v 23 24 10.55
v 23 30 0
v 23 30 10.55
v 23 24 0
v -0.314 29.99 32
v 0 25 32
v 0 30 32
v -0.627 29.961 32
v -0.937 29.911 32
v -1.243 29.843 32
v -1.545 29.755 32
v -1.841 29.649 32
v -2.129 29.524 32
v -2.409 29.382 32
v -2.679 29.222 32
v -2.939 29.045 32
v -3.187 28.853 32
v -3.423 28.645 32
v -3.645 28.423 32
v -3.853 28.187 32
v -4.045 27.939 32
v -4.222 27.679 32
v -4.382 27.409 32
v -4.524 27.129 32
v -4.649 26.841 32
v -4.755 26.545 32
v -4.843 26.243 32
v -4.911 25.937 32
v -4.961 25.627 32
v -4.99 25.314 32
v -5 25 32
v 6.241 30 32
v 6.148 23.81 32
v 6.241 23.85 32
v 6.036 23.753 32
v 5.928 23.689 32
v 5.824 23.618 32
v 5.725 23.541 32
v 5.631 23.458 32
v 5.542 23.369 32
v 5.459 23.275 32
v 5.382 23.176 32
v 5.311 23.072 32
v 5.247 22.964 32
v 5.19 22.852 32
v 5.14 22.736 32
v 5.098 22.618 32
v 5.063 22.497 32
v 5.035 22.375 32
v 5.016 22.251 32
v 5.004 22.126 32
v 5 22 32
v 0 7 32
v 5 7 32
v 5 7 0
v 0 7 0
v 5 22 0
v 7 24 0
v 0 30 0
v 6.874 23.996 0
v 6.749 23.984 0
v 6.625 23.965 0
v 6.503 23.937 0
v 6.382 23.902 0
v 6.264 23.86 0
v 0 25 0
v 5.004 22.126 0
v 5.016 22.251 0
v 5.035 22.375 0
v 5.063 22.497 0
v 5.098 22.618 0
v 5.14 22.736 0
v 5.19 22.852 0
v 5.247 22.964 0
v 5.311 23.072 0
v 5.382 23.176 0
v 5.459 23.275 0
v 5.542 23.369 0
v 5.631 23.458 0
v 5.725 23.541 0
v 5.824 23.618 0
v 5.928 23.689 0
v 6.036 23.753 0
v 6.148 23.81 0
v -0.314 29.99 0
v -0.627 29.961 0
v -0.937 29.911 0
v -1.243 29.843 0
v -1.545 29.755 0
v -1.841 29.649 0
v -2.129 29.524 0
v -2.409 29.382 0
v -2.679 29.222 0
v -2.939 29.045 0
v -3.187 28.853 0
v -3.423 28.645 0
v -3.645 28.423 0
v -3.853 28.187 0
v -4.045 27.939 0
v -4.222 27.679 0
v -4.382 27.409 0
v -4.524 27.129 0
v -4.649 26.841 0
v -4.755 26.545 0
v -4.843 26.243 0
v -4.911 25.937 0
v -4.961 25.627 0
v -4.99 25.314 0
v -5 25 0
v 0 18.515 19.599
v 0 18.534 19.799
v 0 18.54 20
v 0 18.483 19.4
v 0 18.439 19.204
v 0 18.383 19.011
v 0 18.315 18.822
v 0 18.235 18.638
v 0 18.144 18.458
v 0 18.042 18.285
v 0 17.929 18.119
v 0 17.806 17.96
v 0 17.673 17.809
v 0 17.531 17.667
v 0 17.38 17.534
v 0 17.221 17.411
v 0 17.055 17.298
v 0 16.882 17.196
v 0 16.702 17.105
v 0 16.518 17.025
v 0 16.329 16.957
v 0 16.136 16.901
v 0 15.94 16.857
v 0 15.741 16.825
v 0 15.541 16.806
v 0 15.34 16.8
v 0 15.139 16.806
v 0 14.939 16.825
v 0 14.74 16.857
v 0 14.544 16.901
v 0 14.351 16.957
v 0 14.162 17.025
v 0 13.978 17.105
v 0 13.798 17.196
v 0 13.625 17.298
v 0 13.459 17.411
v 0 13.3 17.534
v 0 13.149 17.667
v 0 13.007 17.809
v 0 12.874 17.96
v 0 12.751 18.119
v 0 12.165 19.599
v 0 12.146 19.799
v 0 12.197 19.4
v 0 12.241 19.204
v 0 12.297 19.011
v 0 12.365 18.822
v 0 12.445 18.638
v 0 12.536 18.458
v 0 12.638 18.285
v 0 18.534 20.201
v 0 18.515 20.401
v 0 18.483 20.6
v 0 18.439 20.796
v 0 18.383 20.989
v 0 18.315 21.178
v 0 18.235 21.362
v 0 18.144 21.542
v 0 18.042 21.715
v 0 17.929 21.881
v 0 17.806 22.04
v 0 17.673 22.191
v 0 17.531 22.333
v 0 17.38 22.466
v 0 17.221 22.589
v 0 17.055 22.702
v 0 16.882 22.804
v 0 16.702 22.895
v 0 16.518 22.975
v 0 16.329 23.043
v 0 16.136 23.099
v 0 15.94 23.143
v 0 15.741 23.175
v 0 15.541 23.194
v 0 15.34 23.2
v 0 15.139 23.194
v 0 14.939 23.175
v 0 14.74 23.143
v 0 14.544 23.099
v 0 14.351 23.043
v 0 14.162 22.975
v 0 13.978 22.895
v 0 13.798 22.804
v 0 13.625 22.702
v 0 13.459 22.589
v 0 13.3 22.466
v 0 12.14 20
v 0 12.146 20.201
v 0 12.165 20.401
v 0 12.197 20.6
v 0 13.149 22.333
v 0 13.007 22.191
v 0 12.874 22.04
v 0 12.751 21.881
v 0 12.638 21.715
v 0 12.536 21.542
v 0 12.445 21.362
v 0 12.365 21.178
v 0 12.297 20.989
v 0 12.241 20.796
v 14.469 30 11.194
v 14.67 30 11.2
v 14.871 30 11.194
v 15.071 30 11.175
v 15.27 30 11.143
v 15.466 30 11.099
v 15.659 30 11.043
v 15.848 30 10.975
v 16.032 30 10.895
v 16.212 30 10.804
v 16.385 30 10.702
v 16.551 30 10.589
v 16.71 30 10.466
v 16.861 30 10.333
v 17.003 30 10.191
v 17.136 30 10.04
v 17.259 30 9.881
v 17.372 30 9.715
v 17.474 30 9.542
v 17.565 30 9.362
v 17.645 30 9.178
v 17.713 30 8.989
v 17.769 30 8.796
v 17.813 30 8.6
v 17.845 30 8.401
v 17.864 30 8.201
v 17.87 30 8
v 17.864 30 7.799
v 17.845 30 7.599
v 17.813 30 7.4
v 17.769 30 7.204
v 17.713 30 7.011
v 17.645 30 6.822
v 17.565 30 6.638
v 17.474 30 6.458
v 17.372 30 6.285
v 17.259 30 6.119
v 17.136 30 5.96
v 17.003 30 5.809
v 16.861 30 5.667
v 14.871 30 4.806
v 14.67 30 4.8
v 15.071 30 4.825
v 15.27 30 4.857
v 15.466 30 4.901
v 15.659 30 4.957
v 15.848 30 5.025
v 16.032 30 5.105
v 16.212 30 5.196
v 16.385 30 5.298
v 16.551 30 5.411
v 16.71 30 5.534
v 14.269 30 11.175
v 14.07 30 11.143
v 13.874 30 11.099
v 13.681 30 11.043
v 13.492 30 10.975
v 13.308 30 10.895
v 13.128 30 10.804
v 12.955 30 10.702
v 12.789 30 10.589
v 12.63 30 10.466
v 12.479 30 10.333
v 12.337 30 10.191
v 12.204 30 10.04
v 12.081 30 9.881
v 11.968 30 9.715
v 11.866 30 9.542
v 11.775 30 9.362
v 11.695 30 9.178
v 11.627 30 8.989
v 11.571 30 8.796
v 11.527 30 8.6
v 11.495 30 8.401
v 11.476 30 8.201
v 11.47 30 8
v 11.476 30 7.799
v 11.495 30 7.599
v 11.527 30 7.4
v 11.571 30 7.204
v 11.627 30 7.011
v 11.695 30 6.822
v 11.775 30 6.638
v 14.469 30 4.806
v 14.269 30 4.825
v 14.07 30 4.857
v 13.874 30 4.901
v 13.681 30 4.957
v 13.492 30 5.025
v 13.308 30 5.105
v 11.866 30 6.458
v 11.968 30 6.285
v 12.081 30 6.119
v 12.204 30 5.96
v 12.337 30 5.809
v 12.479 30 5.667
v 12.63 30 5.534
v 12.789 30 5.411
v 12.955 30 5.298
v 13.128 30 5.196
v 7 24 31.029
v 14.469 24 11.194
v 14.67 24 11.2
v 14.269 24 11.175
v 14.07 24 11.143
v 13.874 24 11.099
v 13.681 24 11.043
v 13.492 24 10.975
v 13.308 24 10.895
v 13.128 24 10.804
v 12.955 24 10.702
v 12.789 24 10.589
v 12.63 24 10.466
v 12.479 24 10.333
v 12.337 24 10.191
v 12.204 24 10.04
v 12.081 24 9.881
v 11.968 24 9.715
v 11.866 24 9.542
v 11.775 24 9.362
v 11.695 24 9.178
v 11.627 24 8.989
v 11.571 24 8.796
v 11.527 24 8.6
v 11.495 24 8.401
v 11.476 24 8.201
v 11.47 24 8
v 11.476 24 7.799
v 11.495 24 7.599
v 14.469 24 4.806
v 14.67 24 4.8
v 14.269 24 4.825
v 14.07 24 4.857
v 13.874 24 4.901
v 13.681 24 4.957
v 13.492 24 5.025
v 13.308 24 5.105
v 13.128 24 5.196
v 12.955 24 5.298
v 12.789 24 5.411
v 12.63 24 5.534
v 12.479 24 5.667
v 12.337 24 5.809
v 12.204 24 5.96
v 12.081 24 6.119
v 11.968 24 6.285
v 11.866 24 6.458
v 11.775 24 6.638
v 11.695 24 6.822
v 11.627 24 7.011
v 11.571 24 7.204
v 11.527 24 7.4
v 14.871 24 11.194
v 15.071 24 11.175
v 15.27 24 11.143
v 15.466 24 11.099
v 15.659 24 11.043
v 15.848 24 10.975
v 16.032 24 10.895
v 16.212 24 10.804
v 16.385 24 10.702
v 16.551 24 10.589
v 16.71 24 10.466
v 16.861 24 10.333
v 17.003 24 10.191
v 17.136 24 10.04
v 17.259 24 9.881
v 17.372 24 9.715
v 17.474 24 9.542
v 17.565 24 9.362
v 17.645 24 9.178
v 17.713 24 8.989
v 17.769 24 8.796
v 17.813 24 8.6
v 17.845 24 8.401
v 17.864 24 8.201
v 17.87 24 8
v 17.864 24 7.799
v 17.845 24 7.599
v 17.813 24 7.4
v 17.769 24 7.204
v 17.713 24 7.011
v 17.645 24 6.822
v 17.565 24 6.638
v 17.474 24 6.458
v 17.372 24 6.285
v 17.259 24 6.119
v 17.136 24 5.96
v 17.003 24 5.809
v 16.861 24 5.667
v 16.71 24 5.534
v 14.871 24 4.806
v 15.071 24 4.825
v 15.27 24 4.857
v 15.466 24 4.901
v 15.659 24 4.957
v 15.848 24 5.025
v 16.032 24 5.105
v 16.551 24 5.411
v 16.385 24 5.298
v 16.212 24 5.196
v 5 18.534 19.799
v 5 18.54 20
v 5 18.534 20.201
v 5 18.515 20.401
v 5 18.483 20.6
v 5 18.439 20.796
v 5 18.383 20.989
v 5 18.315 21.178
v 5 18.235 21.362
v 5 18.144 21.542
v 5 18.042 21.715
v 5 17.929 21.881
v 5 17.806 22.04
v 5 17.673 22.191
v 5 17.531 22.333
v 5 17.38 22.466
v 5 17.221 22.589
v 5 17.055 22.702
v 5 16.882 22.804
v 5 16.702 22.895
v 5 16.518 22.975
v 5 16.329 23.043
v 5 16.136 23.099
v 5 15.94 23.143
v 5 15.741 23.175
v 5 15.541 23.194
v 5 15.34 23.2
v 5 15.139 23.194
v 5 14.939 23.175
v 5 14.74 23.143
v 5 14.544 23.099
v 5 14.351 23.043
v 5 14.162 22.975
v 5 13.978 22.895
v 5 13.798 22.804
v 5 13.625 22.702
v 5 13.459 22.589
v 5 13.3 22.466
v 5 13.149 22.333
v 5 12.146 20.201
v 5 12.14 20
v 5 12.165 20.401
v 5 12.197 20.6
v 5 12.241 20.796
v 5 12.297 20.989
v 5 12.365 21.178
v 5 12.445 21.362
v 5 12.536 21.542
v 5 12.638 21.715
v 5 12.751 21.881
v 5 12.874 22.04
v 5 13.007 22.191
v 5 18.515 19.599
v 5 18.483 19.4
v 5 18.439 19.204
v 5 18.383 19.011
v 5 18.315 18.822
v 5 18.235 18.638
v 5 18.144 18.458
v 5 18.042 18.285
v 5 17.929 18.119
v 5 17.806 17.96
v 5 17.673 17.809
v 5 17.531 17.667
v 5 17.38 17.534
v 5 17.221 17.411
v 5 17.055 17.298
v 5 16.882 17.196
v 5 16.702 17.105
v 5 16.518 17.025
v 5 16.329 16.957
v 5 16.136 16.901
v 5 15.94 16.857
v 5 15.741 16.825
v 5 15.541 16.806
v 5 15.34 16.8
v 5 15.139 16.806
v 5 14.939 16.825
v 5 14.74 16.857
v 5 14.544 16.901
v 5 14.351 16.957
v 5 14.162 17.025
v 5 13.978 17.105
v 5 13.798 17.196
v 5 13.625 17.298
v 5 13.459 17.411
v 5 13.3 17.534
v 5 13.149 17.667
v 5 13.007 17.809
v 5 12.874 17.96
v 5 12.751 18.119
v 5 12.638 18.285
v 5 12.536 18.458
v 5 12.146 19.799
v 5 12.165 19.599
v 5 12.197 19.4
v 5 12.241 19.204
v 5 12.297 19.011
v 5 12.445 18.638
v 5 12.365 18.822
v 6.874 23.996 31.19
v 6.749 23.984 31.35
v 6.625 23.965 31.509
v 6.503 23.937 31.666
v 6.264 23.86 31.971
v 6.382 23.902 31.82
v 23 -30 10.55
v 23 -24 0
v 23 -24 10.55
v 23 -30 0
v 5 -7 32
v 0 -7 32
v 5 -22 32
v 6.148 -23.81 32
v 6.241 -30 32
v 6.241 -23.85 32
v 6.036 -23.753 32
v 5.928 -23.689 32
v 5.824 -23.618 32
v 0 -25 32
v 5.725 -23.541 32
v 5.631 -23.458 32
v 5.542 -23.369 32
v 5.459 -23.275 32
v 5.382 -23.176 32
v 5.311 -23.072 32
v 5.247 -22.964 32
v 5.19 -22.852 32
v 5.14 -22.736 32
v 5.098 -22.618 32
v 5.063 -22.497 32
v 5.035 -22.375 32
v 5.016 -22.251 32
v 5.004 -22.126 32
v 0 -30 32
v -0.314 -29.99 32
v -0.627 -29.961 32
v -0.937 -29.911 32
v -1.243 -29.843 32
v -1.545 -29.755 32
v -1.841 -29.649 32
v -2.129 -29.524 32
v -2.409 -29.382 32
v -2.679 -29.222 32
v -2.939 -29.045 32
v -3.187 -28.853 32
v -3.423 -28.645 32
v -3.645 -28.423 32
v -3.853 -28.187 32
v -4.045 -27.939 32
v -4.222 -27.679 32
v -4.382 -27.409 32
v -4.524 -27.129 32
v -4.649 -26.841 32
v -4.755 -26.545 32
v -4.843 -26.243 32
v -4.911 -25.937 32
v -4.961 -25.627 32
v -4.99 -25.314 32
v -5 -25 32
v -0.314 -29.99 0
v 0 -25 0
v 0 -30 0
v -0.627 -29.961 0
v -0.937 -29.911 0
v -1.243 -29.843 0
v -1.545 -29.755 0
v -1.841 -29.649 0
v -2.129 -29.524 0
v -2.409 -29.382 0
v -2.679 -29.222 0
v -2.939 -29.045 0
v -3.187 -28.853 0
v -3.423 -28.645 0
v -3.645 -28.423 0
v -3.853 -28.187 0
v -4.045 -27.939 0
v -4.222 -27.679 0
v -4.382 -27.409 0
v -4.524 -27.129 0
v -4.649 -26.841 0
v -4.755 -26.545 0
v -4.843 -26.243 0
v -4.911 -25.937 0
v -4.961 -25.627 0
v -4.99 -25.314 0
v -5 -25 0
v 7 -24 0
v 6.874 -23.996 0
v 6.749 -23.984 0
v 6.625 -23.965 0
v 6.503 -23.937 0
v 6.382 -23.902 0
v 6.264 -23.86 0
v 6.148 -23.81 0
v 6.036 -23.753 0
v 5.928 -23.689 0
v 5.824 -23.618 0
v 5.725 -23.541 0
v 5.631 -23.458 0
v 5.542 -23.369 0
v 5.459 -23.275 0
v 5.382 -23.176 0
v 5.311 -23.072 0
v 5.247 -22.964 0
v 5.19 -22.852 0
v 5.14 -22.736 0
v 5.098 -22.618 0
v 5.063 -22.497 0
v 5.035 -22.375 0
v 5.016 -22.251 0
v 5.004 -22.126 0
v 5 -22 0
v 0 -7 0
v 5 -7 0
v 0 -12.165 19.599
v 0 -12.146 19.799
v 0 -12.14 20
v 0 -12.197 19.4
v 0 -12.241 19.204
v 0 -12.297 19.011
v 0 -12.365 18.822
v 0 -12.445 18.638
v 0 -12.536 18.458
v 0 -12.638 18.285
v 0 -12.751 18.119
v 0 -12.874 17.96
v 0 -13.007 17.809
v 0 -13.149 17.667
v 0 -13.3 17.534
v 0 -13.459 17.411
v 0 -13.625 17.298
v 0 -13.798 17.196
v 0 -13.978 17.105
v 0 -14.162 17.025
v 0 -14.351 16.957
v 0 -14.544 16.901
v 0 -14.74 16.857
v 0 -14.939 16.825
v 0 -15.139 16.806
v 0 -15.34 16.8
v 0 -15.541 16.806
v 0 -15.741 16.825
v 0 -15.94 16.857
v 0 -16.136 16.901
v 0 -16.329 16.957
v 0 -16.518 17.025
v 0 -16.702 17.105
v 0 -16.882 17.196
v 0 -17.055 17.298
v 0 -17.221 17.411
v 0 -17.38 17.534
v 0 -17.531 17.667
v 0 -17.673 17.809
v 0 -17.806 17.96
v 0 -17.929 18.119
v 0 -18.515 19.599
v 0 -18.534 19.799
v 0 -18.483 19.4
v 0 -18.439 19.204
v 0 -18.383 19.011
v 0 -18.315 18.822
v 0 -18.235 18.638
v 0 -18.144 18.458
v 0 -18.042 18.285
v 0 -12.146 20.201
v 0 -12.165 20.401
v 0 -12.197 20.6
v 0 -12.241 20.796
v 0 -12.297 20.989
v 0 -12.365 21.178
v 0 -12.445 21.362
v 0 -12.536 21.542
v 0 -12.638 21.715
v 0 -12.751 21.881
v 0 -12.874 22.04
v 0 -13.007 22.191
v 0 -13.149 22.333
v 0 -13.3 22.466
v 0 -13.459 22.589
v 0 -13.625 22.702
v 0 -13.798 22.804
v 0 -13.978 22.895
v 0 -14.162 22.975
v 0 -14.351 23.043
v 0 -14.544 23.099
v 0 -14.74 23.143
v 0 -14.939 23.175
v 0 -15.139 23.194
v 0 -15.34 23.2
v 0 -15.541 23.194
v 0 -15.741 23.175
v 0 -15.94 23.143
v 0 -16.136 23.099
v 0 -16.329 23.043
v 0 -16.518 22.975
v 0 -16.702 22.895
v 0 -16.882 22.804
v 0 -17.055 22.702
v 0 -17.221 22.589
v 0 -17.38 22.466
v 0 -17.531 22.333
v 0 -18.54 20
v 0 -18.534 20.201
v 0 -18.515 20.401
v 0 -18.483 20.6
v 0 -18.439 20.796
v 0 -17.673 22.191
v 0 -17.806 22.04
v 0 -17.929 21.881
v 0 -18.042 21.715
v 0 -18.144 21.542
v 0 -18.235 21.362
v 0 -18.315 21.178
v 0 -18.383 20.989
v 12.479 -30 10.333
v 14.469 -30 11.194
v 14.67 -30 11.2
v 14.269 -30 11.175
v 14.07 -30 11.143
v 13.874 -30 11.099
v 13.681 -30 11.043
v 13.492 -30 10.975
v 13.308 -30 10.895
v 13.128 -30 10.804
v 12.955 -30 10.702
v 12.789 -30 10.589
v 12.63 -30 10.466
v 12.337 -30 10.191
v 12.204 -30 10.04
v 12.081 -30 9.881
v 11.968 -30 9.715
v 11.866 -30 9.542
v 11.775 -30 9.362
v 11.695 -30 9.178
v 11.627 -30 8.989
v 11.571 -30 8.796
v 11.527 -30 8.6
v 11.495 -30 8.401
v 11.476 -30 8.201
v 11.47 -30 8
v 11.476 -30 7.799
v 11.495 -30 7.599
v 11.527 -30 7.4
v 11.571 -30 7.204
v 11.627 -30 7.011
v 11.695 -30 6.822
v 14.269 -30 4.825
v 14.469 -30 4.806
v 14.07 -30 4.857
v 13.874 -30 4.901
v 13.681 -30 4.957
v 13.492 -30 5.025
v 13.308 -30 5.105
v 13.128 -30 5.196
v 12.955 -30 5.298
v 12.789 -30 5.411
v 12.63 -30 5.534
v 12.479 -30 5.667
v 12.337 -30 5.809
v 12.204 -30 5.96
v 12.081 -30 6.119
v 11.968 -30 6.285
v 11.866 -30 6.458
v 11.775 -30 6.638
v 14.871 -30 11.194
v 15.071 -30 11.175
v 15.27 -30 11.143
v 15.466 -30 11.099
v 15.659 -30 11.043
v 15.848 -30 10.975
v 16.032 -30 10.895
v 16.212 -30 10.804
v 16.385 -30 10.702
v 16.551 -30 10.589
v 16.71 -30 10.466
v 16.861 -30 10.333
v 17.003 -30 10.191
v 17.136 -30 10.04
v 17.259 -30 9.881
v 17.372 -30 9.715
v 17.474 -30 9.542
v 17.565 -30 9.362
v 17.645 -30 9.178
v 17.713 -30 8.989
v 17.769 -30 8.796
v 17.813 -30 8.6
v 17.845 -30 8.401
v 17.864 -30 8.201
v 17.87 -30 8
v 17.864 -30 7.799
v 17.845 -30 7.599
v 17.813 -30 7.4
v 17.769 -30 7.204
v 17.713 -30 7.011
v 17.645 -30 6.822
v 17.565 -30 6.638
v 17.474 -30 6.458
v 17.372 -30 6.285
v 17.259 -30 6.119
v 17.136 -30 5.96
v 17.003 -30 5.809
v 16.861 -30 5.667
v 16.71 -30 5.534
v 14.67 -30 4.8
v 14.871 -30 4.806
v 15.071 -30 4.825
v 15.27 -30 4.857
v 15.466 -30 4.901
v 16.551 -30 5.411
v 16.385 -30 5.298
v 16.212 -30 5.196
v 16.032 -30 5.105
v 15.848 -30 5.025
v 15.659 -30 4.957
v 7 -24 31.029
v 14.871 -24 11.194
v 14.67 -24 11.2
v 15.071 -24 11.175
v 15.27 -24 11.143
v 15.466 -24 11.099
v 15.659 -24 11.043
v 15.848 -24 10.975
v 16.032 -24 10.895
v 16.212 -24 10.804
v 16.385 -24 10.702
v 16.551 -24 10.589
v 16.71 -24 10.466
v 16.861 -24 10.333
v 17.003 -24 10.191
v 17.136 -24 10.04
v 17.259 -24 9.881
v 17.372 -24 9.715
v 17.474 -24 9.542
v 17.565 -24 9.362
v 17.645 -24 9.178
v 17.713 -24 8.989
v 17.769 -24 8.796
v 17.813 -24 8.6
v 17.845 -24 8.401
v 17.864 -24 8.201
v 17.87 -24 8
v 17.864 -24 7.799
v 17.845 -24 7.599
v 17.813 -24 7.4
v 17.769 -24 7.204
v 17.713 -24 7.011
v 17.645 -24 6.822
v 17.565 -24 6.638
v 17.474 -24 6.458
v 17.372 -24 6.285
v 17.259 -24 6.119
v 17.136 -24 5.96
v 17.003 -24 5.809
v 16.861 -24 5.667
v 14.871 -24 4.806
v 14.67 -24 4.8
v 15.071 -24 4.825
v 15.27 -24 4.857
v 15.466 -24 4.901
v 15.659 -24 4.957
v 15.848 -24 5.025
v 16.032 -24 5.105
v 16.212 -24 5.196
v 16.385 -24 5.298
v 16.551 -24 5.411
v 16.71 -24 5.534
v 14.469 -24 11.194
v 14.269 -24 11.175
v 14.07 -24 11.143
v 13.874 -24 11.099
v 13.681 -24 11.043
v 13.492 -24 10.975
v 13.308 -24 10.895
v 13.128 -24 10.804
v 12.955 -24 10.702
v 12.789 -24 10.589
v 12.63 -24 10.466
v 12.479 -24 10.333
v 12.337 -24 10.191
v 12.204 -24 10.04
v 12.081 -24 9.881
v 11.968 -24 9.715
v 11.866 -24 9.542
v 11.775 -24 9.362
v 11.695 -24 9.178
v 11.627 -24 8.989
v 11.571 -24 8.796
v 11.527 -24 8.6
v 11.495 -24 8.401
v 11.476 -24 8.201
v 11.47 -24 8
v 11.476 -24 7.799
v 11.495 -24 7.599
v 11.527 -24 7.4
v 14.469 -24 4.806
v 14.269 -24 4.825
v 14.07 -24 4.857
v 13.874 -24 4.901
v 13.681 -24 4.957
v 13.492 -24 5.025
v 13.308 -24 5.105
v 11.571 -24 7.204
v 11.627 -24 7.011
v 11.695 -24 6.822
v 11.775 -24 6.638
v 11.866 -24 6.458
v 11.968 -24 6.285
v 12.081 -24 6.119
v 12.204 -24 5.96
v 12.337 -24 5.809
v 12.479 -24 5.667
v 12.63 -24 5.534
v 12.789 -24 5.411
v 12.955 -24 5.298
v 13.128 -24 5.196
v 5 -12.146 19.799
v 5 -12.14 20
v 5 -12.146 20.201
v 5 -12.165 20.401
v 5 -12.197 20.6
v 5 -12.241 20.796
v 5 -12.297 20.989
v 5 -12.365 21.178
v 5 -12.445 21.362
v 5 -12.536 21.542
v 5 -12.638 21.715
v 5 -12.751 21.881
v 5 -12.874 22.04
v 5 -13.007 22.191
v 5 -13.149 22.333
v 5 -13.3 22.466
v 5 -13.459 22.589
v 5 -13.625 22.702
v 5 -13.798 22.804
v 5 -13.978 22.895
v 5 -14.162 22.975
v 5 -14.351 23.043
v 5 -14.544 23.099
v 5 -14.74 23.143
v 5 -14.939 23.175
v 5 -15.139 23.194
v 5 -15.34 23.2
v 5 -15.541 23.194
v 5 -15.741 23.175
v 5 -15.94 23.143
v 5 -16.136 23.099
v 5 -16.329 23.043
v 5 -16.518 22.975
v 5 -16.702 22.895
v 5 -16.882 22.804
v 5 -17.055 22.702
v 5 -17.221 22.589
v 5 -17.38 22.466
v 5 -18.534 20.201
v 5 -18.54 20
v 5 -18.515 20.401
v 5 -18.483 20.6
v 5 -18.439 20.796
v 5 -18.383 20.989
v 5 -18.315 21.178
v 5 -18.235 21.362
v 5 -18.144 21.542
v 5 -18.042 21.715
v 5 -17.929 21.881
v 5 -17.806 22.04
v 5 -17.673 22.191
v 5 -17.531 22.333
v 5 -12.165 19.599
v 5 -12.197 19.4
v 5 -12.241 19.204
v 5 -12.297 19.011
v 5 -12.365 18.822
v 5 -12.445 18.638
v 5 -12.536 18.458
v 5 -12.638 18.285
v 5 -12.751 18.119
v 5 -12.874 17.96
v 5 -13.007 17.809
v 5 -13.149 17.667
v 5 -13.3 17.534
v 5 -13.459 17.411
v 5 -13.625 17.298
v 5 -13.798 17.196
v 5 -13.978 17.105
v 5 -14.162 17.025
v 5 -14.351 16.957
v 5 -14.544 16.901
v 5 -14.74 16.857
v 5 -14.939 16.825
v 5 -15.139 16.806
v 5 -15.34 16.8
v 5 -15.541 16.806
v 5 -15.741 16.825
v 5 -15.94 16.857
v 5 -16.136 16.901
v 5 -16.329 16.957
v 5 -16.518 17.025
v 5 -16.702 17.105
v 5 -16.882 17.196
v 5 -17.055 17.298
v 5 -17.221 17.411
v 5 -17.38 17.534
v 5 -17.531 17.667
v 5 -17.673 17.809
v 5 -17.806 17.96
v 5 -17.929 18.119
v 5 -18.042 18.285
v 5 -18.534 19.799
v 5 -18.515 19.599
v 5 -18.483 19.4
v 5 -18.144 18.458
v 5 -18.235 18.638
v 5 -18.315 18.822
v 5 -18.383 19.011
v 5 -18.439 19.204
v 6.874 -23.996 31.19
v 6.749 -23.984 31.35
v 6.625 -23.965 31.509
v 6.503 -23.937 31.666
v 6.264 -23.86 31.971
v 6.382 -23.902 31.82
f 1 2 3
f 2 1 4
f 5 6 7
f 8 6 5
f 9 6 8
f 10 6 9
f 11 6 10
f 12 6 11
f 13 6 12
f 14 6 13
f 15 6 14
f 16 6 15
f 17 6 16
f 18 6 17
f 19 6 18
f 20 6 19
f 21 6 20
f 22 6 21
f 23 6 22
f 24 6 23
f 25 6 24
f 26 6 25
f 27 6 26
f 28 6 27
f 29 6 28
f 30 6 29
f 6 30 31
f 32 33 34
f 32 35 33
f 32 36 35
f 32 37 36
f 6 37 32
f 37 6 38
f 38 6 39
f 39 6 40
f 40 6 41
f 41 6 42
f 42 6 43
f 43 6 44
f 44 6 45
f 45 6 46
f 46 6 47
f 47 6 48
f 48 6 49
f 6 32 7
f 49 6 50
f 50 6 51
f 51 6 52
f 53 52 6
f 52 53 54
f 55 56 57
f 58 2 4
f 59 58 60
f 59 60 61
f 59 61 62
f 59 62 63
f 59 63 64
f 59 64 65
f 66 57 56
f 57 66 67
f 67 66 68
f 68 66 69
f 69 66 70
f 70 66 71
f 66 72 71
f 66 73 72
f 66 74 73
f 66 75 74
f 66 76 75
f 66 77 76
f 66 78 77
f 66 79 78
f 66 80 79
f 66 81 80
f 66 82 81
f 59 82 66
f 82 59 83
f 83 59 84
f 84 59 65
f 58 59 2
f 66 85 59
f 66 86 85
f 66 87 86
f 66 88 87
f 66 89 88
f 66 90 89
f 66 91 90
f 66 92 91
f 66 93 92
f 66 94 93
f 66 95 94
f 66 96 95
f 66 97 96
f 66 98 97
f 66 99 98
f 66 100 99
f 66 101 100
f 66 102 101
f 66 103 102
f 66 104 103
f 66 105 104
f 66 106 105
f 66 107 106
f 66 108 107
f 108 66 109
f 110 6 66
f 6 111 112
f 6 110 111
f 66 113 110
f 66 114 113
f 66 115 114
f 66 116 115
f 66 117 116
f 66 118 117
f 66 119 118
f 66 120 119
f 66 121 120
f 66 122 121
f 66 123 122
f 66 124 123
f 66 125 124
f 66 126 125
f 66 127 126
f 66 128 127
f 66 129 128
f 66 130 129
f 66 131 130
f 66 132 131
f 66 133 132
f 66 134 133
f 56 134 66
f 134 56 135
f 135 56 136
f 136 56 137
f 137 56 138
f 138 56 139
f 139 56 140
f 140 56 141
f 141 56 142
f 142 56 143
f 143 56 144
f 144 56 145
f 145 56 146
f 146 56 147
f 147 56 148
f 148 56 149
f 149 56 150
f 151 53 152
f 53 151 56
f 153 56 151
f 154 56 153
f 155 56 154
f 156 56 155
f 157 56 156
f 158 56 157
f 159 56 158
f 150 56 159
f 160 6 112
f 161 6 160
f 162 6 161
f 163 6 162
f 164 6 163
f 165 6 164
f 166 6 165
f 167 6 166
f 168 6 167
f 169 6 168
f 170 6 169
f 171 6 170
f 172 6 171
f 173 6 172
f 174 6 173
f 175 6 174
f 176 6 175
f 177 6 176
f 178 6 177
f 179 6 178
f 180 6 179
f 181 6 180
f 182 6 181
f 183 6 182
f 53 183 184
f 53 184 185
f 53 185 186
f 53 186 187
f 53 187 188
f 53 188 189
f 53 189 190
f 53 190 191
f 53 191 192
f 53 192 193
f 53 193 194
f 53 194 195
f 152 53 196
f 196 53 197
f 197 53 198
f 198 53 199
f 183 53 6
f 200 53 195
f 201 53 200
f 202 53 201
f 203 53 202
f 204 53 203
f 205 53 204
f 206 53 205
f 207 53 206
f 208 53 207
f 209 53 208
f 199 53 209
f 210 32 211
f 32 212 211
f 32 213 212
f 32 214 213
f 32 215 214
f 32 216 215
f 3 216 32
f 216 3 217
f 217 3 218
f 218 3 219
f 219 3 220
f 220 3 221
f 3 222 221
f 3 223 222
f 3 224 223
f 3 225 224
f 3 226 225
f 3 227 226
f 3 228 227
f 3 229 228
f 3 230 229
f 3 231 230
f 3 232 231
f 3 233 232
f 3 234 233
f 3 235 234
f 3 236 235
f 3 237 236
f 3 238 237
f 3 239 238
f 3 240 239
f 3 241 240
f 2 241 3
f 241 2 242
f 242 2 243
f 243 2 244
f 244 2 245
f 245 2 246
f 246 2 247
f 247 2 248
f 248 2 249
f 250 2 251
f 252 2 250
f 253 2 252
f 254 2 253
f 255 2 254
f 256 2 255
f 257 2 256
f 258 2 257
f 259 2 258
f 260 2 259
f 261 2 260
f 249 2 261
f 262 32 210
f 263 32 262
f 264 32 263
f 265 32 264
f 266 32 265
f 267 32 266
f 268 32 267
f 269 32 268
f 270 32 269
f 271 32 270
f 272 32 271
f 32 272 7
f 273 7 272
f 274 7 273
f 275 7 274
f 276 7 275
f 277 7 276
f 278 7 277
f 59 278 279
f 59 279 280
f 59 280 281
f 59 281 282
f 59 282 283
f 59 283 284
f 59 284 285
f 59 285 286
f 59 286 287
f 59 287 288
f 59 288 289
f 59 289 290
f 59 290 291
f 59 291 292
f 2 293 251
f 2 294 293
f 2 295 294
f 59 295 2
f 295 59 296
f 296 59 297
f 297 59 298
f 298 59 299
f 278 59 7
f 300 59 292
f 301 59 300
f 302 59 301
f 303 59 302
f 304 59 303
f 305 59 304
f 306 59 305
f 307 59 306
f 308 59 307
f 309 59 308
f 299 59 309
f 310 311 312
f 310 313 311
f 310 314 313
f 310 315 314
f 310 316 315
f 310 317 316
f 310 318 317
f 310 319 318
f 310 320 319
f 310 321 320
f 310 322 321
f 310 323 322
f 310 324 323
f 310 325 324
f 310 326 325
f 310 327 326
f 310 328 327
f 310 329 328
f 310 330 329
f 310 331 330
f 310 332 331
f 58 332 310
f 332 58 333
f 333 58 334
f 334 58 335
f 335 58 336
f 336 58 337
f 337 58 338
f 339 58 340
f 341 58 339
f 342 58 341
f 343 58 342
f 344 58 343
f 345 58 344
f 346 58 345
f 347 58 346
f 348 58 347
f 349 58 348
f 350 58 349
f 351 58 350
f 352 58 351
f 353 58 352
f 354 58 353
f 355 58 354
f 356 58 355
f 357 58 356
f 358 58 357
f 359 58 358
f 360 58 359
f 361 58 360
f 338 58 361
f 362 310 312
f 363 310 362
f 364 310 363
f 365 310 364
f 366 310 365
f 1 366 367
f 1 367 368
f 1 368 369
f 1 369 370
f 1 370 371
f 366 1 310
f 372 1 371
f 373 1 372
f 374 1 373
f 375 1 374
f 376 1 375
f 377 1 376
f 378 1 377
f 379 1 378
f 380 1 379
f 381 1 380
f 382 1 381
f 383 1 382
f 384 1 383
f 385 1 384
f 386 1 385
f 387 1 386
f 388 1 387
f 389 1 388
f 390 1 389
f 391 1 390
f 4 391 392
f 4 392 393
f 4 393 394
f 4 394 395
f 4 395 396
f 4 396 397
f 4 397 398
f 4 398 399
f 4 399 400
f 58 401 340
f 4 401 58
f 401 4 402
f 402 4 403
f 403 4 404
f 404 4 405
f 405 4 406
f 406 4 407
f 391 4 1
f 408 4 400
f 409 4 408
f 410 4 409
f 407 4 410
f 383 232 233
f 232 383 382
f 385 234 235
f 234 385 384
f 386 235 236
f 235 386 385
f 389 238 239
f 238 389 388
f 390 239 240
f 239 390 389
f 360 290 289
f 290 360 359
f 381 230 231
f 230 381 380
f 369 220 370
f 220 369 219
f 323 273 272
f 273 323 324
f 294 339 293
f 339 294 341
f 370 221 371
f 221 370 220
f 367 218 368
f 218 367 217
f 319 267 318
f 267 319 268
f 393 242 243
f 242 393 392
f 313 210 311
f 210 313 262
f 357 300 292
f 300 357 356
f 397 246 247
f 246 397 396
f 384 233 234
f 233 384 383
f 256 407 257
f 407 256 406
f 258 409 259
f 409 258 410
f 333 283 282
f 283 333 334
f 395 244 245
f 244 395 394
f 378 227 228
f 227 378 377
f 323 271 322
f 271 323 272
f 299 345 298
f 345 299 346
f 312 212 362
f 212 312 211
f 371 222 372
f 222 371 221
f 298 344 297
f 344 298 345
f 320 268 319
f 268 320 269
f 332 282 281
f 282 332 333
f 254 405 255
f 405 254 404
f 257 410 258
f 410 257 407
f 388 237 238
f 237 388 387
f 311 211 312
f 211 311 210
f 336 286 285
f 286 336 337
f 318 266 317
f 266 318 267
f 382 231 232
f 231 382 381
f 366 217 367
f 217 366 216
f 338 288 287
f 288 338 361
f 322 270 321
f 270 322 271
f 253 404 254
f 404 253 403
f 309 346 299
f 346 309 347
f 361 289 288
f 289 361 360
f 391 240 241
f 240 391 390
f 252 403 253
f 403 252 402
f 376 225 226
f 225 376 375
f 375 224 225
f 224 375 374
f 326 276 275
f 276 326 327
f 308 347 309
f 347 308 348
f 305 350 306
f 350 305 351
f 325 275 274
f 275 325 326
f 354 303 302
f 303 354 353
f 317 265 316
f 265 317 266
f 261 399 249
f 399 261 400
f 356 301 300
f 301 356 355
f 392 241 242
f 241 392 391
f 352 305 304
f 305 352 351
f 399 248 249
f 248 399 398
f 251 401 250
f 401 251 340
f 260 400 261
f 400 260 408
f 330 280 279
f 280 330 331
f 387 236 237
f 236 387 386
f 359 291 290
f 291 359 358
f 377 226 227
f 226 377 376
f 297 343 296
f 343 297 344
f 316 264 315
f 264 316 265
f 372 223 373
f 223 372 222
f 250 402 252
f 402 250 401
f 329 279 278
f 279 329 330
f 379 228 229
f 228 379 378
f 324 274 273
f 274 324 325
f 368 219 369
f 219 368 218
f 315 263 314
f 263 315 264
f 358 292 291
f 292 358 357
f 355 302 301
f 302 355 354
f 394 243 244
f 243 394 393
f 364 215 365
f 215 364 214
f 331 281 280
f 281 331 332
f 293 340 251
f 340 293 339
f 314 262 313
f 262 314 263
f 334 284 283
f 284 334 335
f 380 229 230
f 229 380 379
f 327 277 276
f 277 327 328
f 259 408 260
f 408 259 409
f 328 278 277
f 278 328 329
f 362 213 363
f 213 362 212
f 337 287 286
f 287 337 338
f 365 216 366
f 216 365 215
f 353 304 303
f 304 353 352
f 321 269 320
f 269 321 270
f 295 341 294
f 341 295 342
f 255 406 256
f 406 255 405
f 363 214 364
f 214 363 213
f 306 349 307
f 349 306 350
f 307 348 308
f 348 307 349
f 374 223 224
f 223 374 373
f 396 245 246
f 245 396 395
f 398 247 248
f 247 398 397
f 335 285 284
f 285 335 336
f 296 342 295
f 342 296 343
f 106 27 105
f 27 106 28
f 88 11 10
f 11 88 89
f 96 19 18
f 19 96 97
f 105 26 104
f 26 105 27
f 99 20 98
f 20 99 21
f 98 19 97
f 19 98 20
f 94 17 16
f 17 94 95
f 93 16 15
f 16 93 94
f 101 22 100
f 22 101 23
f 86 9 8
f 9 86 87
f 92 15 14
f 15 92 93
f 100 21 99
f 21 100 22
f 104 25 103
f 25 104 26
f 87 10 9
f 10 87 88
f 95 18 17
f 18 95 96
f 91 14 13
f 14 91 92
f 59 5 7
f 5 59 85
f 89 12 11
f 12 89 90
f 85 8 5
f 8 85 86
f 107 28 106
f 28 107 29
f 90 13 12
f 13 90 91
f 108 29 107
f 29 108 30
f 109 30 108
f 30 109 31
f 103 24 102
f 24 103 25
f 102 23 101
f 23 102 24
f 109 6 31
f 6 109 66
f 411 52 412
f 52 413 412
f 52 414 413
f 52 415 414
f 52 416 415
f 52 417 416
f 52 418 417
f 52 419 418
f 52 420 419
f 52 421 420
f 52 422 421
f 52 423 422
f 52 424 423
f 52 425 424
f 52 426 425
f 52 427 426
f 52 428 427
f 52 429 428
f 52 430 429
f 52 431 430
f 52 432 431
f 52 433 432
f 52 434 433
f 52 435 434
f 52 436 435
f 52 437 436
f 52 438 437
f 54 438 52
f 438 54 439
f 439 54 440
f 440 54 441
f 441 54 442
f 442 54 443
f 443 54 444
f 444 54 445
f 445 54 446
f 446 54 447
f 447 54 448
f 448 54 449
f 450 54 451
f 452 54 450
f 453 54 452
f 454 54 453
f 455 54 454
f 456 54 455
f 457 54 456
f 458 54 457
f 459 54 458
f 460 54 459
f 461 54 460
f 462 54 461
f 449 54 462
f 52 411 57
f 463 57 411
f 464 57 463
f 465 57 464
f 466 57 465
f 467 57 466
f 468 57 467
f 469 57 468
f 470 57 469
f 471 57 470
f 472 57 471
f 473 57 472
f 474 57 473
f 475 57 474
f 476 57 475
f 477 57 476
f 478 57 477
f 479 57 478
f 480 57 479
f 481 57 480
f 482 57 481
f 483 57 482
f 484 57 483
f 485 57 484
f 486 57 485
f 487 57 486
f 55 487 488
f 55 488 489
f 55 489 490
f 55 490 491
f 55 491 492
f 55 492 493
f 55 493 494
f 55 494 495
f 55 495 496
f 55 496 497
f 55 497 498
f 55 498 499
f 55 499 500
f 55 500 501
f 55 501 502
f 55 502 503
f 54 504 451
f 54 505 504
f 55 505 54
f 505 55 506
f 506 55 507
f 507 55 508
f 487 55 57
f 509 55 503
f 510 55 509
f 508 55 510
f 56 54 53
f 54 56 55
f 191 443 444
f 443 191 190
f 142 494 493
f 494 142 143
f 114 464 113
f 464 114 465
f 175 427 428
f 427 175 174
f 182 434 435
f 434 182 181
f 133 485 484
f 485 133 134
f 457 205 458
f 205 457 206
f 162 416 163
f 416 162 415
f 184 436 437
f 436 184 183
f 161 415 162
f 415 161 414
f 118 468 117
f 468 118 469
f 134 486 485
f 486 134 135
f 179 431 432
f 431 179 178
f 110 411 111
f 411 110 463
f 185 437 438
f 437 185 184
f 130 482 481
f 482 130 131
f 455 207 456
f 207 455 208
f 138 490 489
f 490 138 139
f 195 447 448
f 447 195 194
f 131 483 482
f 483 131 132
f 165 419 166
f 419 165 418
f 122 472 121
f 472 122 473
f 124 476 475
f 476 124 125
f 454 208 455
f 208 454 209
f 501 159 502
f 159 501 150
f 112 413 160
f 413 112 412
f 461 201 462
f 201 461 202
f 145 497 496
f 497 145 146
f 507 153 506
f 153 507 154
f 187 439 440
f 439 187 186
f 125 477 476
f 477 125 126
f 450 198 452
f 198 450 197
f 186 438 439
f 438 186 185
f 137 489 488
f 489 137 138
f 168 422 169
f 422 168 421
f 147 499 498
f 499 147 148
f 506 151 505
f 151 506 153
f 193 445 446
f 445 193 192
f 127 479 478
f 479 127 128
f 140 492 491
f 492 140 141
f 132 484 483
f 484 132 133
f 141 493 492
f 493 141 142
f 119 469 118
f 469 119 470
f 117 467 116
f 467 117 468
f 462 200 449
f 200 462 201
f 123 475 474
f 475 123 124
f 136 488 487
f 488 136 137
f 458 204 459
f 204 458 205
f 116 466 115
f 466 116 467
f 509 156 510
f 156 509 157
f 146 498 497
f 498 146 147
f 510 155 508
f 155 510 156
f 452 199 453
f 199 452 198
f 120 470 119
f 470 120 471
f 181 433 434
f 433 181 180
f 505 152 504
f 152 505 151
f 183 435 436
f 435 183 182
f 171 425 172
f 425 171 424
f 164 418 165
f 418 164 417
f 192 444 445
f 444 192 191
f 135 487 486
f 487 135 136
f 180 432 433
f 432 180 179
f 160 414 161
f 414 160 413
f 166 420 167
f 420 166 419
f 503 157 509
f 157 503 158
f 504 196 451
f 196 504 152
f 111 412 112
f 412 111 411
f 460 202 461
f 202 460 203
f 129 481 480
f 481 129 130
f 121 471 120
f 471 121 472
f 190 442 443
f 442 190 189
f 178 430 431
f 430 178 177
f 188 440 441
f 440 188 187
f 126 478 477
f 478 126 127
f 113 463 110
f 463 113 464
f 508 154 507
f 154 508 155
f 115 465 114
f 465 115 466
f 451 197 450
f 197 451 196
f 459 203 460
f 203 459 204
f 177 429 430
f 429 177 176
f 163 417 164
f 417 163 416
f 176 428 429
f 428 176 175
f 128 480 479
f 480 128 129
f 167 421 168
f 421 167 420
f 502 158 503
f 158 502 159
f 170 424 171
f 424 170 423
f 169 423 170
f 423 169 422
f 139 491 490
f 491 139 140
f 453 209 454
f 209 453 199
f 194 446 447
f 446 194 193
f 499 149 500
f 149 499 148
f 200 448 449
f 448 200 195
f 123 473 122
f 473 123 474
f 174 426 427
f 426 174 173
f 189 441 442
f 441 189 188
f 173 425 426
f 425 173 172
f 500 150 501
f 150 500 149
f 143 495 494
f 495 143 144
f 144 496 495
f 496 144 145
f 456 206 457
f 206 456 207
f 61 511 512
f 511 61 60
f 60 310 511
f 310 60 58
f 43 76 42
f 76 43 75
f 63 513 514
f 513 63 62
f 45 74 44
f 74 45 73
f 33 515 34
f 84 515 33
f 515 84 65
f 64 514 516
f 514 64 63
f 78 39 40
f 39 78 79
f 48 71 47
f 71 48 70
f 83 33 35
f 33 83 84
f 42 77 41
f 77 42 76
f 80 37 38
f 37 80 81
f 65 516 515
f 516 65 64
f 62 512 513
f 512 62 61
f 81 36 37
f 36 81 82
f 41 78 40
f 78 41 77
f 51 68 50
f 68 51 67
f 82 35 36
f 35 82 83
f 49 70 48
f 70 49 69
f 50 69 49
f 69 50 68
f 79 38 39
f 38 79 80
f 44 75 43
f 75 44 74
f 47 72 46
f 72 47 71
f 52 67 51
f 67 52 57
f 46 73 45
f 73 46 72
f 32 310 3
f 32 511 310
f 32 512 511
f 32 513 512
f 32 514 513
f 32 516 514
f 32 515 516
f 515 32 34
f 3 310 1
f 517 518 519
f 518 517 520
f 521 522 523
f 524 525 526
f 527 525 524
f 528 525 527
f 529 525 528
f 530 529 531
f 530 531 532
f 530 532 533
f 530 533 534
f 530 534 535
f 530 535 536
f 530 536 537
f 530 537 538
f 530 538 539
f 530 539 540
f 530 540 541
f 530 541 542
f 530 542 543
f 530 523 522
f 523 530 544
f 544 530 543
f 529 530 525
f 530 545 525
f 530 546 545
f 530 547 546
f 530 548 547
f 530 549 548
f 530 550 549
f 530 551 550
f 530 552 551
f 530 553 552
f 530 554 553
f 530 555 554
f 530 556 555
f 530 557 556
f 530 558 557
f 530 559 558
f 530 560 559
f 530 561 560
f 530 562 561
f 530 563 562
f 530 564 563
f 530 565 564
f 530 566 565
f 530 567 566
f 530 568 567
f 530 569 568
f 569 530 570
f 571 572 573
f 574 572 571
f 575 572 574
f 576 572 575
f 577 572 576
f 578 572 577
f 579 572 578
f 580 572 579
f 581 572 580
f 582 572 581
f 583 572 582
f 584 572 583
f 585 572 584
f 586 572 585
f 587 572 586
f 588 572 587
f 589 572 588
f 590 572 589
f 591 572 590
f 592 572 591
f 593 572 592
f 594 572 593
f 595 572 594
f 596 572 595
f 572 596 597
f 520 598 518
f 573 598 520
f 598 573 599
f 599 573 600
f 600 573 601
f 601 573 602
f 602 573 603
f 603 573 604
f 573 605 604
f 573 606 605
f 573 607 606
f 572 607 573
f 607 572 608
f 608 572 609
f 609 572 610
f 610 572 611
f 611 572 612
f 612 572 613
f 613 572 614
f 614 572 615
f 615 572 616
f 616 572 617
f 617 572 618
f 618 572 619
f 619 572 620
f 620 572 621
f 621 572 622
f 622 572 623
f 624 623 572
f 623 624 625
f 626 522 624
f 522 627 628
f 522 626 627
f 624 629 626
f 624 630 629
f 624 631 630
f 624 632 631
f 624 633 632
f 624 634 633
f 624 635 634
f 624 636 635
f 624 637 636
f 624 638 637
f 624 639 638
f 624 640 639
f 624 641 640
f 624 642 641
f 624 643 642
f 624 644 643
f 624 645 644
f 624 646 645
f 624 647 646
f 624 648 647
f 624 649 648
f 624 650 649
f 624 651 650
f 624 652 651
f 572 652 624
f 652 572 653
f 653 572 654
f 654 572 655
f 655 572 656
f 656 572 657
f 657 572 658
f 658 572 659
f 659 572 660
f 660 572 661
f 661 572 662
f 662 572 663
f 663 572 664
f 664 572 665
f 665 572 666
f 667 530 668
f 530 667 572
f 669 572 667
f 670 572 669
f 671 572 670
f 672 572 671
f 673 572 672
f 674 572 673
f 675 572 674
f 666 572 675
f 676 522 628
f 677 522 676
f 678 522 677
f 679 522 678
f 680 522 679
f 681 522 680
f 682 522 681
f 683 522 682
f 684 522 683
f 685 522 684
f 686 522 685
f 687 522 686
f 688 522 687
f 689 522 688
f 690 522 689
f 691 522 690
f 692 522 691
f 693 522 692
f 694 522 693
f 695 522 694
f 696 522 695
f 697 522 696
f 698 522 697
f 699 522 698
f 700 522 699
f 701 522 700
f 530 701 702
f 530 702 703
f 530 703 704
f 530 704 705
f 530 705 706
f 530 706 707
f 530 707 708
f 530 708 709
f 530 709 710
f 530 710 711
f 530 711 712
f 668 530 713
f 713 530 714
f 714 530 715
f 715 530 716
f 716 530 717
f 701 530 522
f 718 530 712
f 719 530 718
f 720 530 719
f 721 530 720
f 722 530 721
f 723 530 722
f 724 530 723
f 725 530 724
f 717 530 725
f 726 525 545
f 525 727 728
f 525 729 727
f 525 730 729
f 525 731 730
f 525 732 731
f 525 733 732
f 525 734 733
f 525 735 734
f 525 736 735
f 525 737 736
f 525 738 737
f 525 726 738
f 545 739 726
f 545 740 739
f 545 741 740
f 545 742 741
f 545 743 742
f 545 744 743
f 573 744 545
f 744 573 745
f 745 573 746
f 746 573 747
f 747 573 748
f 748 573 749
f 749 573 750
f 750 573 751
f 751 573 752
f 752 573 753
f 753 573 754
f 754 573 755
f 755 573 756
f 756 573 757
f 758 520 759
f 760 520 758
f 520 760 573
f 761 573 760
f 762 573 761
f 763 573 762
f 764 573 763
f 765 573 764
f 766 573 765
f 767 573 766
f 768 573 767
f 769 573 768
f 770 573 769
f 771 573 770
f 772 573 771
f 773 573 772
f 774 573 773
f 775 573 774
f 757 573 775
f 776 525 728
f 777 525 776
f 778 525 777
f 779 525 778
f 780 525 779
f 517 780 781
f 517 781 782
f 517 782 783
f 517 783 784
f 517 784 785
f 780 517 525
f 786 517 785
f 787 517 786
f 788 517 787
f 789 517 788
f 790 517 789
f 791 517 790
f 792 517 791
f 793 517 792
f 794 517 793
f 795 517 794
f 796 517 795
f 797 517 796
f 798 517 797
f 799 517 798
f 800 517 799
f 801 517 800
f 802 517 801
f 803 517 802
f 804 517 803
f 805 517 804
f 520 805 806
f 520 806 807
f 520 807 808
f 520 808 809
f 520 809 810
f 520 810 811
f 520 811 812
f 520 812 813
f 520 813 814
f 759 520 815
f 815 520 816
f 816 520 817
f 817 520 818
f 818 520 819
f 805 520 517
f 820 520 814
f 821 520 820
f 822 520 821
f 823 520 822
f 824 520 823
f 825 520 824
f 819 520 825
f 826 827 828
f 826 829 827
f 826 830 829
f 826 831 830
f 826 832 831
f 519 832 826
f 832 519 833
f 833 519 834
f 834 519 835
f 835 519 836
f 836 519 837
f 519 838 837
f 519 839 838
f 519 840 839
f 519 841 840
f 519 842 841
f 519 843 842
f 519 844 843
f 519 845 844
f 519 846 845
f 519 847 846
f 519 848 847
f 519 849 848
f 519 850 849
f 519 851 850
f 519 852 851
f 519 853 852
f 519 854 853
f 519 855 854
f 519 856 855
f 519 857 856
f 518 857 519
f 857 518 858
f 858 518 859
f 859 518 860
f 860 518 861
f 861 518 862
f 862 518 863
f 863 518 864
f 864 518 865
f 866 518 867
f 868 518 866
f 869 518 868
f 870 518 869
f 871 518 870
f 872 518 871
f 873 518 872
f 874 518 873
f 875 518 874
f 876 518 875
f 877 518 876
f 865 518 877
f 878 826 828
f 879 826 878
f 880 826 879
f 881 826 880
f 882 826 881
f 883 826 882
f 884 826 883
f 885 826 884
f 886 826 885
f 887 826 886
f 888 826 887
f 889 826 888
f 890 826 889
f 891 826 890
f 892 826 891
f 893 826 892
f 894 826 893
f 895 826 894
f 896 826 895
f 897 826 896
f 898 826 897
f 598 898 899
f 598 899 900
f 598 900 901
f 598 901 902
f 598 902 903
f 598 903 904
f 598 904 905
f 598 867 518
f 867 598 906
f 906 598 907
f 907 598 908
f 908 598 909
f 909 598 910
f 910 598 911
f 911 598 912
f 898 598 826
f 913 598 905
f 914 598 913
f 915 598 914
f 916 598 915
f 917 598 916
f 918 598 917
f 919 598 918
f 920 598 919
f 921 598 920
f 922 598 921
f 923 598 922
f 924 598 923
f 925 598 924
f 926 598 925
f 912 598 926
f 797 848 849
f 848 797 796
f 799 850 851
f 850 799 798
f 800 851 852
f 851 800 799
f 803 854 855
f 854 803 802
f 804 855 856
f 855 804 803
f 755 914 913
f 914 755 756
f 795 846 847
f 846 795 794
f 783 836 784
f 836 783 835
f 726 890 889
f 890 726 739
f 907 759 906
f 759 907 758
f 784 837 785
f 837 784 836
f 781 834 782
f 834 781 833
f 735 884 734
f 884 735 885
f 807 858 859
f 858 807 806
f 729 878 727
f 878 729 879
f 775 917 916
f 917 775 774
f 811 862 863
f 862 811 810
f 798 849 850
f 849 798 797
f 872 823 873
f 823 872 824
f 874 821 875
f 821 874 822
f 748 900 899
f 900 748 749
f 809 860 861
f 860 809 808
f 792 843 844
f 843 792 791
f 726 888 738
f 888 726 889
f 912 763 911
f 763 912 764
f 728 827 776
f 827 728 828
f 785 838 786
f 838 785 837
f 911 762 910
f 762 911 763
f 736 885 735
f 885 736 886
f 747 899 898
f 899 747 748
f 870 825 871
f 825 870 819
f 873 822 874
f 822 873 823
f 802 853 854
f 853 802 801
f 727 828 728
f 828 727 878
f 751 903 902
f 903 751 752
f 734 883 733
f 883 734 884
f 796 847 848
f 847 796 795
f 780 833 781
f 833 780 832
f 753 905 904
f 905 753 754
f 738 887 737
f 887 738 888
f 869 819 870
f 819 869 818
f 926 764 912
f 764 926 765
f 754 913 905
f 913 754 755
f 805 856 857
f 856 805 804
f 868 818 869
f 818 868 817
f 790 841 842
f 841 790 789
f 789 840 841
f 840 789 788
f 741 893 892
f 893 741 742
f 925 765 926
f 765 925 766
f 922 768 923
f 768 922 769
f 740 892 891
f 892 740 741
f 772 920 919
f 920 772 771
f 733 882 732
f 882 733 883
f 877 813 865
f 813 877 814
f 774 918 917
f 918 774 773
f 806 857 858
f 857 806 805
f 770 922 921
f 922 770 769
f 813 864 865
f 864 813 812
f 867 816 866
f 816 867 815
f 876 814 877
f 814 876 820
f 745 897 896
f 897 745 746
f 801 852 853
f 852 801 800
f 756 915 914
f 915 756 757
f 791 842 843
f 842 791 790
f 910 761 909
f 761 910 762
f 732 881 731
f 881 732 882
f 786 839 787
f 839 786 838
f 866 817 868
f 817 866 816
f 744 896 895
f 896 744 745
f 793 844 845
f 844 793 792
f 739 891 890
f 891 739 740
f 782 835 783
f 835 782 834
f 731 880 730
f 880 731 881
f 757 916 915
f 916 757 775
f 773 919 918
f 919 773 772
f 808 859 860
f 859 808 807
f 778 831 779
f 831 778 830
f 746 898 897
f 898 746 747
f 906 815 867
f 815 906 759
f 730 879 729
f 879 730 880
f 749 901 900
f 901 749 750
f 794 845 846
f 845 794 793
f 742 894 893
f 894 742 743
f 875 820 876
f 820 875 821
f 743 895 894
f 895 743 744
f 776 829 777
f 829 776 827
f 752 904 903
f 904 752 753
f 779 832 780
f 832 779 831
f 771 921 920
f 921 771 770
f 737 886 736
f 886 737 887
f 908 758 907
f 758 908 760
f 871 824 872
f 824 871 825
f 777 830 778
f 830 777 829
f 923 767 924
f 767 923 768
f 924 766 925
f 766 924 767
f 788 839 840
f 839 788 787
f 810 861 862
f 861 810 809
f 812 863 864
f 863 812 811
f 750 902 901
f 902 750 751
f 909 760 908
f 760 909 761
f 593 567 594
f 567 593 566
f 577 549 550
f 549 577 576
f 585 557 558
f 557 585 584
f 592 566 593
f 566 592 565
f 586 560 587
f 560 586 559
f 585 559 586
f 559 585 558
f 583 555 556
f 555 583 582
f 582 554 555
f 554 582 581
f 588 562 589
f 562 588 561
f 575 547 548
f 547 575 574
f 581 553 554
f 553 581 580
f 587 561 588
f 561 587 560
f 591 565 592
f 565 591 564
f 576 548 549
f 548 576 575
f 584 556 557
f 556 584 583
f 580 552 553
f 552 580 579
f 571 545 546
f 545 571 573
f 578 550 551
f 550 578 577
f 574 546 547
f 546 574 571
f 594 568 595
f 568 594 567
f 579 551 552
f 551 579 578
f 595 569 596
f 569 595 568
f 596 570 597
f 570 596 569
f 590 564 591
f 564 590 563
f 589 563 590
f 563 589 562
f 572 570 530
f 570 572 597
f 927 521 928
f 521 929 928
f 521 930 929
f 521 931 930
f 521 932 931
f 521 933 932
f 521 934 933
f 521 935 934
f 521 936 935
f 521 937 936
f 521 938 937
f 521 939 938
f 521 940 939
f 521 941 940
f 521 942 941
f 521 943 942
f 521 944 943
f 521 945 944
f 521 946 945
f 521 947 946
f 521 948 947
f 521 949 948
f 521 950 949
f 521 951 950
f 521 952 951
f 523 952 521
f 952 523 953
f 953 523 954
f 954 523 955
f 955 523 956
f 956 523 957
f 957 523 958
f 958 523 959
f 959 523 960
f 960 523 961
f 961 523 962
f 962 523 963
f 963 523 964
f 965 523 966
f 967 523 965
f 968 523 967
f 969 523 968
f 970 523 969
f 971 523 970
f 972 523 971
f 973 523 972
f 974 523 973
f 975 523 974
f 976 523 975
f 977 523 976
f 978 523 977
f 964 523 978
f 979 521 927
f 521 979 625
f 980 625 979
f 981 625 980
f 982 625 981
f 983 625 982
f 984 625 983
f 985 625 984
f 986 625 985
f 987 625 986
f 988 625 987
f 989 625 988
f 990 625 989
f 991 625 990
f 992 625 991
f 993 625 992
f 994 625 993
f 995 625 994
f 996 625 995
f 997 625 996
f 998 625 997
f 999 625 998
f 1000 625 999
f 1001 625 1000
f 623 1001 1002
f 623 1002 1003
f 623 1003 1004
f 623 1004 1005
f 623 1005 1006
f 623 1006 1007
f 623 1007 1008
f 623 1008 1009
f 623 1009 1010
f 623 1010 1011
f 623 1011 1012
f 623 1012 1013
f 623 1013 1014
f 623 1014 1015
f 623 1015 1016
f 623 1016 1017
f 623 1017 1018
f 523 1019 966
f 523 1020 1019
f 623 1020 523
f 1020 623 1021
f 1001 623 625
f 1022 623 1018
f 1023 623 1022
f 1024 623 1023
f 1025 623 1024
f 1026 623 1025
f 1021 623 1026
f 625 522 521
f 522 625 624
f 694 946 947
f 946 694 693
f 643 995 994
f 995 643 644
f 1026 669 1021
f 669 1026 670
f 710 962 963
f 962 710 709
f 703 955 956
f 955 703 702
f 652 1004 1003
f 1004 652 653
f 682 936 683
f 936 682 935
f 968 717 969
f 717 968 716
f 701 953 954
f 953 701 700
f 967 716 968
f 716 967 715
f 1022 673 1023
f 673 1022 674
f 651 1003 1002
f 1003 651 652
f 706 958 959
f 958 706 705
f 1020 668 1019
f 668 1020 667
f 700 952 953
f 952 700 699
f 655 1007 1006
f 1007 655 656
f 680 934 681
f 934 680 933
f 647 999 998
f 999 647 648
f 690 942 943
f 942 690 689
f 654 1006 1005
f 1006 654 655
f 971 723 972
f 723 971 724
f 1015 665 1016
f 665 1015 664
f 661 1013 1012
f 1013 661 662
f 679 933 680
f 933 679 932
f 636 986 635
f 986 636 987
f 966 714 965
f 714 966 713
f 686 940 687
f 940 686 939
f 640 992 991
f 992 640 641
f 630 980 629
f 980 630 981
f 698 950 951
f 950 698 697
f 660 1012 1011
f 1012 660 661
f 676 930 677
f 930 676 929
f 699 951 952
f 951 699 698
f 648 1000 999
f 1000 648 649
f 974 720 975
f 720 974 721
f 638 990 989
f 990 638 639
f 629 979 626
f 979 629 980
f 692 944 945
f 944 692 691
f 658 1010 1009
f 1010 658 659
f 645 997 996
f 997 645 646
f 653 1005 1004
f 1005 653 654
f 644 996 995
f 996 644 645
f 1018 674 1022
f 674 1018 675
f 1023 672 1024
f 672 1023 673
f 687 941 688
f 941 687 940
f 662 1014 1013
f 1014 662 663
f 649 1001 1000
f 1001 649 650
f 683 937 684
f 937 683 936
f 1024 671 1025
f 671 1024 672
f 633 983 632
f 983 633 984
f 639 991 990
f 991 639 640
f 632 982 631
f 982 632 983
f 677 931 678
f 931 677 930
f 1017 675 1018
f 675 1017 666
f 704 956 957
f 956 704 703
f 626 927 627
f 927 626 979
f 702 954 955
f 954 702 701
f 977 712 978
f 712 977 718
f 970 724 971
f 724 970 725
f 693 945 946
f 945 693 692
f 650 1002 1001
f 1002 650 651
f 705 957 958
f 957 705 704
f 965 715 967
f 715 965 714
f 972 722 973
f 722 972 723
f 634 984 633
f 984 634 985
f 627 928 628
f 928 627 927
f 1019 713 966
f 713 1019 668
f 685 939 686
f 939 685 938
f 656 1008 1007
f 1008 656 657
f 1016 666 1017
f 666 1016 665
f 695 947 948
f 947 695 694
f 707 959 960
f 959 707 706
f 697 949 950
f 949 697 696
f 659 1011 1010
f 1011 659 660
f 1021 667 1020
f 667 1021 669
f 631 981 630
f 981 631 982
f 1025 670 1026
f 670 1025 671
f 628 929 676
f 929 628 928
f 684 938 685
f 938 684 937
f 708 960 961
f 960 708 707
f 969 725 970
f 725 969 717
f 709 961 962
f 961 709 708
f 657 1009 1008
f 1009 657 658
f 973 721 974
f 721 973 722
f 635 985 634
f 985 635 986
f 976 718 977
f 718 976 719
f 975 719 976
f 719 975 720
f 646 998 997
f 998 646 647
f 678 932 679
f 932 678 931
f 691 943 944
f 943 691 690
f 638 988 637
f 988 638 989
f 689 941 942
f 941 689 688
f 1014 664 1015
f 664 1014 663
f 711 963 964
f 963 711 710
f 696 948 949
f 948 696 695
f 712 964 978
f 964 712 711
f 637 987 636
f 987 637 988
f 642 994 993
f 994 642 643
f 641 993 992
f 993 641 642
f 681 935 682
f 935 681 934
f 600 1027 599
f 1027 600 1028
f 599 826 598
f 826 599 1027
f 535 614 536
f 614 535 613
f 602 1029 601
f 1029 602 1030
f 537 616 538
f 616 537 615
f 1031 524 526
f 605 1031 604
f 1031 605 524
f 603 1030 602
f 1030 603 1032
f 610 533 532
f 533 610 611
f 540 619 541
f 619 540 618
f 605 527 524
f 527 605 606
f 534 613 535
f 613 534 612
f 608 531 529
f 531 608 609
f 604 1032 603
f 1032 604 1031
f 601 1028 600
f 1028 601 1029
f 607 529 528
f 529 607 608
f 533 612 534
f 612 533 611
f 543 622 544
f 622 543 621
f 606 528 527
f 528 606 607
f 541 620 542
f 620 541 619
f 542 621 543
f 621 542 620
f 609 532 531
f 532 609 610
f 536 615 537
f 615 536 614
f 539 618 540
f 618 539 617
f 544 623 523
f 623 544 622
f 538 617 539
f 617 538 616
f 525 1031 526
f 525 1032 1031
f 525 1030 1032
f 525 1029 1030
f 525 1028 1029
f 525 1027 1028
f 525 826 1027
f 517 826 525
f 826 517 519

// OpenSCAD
// Created from Code_Diagonal (x2).stl
// https://github.com/Mecan0/Code
// By J.Rodigo (www.jra.so)
// Licence Creative commons atribution & share alike.

/**************************/
// Parámetros de la pieza  /
/**************************/

dTalaX = 6.4;	//Diámetro del taladro del bloque X 

dTalaY = 6.4;	//Diámetro del taladro del bloque Y 


// Bloque a lo largo del eje X
module bloqueX(){
	// Bloque y taladro
	difference () {
		translate([0, -6, 0])
		cube([23, 6, 32]);
	
		translate([14.67, 1, 8])
		rotate( 90, [1, 0, 0])
		cylinder(h = 8, r = dTalaX/2, $fn=100);
	}

	// Esquina redondeada
	difference () {
		translate([0, -5, 0])
		cylinder(h = 32, r = 5, $fn=100);

		translate([-5, -10, -1])
		cube([10, 5, 34]);
	}	
}

// Bloque a lo largo del eje Y
module bloqueY(){
	// Bloque y taladro
	difference () {
		translate([0, -23, 0])
		cube([5, 23, 32]);

		translate([-1, -14.66, 20])
		rotate( 90, [0, 1, 0])
		cylinder(h = 7, r = dTalaY/2, $fn=100);
	}
}

// Redondeo entre los bloques X y Y
module redondeoXY(){
	difference () {
		cube([2, 2, 32]);
		
		translate([2, 0, -1])
		cylinder(h = 34, r = 2, $fn=100);
	}
}

// Unión de todos los bloques
module pieza(){
	difference () {
		union() {
			bloqueX();

			bloqueY();

			translate([5, -8, 0])
			redondeoXY();
		}	

		//Chaflan que afecta al bloqueX() y al redondeoXY()
		translate([23, -7, 10.55])
		rotate( 38, [0, -1, 0])
		cube([18, 8, 34]);	
	}
}

/**************************/
//  Generamos las piezas   /
/**************************/

// Pieza normal
translate([0, 30, 0])
pieza();

// Pieza simetrica
translate([0, -30, 0])
mirror([ 0, 1, 0 ]) 
pieza();
